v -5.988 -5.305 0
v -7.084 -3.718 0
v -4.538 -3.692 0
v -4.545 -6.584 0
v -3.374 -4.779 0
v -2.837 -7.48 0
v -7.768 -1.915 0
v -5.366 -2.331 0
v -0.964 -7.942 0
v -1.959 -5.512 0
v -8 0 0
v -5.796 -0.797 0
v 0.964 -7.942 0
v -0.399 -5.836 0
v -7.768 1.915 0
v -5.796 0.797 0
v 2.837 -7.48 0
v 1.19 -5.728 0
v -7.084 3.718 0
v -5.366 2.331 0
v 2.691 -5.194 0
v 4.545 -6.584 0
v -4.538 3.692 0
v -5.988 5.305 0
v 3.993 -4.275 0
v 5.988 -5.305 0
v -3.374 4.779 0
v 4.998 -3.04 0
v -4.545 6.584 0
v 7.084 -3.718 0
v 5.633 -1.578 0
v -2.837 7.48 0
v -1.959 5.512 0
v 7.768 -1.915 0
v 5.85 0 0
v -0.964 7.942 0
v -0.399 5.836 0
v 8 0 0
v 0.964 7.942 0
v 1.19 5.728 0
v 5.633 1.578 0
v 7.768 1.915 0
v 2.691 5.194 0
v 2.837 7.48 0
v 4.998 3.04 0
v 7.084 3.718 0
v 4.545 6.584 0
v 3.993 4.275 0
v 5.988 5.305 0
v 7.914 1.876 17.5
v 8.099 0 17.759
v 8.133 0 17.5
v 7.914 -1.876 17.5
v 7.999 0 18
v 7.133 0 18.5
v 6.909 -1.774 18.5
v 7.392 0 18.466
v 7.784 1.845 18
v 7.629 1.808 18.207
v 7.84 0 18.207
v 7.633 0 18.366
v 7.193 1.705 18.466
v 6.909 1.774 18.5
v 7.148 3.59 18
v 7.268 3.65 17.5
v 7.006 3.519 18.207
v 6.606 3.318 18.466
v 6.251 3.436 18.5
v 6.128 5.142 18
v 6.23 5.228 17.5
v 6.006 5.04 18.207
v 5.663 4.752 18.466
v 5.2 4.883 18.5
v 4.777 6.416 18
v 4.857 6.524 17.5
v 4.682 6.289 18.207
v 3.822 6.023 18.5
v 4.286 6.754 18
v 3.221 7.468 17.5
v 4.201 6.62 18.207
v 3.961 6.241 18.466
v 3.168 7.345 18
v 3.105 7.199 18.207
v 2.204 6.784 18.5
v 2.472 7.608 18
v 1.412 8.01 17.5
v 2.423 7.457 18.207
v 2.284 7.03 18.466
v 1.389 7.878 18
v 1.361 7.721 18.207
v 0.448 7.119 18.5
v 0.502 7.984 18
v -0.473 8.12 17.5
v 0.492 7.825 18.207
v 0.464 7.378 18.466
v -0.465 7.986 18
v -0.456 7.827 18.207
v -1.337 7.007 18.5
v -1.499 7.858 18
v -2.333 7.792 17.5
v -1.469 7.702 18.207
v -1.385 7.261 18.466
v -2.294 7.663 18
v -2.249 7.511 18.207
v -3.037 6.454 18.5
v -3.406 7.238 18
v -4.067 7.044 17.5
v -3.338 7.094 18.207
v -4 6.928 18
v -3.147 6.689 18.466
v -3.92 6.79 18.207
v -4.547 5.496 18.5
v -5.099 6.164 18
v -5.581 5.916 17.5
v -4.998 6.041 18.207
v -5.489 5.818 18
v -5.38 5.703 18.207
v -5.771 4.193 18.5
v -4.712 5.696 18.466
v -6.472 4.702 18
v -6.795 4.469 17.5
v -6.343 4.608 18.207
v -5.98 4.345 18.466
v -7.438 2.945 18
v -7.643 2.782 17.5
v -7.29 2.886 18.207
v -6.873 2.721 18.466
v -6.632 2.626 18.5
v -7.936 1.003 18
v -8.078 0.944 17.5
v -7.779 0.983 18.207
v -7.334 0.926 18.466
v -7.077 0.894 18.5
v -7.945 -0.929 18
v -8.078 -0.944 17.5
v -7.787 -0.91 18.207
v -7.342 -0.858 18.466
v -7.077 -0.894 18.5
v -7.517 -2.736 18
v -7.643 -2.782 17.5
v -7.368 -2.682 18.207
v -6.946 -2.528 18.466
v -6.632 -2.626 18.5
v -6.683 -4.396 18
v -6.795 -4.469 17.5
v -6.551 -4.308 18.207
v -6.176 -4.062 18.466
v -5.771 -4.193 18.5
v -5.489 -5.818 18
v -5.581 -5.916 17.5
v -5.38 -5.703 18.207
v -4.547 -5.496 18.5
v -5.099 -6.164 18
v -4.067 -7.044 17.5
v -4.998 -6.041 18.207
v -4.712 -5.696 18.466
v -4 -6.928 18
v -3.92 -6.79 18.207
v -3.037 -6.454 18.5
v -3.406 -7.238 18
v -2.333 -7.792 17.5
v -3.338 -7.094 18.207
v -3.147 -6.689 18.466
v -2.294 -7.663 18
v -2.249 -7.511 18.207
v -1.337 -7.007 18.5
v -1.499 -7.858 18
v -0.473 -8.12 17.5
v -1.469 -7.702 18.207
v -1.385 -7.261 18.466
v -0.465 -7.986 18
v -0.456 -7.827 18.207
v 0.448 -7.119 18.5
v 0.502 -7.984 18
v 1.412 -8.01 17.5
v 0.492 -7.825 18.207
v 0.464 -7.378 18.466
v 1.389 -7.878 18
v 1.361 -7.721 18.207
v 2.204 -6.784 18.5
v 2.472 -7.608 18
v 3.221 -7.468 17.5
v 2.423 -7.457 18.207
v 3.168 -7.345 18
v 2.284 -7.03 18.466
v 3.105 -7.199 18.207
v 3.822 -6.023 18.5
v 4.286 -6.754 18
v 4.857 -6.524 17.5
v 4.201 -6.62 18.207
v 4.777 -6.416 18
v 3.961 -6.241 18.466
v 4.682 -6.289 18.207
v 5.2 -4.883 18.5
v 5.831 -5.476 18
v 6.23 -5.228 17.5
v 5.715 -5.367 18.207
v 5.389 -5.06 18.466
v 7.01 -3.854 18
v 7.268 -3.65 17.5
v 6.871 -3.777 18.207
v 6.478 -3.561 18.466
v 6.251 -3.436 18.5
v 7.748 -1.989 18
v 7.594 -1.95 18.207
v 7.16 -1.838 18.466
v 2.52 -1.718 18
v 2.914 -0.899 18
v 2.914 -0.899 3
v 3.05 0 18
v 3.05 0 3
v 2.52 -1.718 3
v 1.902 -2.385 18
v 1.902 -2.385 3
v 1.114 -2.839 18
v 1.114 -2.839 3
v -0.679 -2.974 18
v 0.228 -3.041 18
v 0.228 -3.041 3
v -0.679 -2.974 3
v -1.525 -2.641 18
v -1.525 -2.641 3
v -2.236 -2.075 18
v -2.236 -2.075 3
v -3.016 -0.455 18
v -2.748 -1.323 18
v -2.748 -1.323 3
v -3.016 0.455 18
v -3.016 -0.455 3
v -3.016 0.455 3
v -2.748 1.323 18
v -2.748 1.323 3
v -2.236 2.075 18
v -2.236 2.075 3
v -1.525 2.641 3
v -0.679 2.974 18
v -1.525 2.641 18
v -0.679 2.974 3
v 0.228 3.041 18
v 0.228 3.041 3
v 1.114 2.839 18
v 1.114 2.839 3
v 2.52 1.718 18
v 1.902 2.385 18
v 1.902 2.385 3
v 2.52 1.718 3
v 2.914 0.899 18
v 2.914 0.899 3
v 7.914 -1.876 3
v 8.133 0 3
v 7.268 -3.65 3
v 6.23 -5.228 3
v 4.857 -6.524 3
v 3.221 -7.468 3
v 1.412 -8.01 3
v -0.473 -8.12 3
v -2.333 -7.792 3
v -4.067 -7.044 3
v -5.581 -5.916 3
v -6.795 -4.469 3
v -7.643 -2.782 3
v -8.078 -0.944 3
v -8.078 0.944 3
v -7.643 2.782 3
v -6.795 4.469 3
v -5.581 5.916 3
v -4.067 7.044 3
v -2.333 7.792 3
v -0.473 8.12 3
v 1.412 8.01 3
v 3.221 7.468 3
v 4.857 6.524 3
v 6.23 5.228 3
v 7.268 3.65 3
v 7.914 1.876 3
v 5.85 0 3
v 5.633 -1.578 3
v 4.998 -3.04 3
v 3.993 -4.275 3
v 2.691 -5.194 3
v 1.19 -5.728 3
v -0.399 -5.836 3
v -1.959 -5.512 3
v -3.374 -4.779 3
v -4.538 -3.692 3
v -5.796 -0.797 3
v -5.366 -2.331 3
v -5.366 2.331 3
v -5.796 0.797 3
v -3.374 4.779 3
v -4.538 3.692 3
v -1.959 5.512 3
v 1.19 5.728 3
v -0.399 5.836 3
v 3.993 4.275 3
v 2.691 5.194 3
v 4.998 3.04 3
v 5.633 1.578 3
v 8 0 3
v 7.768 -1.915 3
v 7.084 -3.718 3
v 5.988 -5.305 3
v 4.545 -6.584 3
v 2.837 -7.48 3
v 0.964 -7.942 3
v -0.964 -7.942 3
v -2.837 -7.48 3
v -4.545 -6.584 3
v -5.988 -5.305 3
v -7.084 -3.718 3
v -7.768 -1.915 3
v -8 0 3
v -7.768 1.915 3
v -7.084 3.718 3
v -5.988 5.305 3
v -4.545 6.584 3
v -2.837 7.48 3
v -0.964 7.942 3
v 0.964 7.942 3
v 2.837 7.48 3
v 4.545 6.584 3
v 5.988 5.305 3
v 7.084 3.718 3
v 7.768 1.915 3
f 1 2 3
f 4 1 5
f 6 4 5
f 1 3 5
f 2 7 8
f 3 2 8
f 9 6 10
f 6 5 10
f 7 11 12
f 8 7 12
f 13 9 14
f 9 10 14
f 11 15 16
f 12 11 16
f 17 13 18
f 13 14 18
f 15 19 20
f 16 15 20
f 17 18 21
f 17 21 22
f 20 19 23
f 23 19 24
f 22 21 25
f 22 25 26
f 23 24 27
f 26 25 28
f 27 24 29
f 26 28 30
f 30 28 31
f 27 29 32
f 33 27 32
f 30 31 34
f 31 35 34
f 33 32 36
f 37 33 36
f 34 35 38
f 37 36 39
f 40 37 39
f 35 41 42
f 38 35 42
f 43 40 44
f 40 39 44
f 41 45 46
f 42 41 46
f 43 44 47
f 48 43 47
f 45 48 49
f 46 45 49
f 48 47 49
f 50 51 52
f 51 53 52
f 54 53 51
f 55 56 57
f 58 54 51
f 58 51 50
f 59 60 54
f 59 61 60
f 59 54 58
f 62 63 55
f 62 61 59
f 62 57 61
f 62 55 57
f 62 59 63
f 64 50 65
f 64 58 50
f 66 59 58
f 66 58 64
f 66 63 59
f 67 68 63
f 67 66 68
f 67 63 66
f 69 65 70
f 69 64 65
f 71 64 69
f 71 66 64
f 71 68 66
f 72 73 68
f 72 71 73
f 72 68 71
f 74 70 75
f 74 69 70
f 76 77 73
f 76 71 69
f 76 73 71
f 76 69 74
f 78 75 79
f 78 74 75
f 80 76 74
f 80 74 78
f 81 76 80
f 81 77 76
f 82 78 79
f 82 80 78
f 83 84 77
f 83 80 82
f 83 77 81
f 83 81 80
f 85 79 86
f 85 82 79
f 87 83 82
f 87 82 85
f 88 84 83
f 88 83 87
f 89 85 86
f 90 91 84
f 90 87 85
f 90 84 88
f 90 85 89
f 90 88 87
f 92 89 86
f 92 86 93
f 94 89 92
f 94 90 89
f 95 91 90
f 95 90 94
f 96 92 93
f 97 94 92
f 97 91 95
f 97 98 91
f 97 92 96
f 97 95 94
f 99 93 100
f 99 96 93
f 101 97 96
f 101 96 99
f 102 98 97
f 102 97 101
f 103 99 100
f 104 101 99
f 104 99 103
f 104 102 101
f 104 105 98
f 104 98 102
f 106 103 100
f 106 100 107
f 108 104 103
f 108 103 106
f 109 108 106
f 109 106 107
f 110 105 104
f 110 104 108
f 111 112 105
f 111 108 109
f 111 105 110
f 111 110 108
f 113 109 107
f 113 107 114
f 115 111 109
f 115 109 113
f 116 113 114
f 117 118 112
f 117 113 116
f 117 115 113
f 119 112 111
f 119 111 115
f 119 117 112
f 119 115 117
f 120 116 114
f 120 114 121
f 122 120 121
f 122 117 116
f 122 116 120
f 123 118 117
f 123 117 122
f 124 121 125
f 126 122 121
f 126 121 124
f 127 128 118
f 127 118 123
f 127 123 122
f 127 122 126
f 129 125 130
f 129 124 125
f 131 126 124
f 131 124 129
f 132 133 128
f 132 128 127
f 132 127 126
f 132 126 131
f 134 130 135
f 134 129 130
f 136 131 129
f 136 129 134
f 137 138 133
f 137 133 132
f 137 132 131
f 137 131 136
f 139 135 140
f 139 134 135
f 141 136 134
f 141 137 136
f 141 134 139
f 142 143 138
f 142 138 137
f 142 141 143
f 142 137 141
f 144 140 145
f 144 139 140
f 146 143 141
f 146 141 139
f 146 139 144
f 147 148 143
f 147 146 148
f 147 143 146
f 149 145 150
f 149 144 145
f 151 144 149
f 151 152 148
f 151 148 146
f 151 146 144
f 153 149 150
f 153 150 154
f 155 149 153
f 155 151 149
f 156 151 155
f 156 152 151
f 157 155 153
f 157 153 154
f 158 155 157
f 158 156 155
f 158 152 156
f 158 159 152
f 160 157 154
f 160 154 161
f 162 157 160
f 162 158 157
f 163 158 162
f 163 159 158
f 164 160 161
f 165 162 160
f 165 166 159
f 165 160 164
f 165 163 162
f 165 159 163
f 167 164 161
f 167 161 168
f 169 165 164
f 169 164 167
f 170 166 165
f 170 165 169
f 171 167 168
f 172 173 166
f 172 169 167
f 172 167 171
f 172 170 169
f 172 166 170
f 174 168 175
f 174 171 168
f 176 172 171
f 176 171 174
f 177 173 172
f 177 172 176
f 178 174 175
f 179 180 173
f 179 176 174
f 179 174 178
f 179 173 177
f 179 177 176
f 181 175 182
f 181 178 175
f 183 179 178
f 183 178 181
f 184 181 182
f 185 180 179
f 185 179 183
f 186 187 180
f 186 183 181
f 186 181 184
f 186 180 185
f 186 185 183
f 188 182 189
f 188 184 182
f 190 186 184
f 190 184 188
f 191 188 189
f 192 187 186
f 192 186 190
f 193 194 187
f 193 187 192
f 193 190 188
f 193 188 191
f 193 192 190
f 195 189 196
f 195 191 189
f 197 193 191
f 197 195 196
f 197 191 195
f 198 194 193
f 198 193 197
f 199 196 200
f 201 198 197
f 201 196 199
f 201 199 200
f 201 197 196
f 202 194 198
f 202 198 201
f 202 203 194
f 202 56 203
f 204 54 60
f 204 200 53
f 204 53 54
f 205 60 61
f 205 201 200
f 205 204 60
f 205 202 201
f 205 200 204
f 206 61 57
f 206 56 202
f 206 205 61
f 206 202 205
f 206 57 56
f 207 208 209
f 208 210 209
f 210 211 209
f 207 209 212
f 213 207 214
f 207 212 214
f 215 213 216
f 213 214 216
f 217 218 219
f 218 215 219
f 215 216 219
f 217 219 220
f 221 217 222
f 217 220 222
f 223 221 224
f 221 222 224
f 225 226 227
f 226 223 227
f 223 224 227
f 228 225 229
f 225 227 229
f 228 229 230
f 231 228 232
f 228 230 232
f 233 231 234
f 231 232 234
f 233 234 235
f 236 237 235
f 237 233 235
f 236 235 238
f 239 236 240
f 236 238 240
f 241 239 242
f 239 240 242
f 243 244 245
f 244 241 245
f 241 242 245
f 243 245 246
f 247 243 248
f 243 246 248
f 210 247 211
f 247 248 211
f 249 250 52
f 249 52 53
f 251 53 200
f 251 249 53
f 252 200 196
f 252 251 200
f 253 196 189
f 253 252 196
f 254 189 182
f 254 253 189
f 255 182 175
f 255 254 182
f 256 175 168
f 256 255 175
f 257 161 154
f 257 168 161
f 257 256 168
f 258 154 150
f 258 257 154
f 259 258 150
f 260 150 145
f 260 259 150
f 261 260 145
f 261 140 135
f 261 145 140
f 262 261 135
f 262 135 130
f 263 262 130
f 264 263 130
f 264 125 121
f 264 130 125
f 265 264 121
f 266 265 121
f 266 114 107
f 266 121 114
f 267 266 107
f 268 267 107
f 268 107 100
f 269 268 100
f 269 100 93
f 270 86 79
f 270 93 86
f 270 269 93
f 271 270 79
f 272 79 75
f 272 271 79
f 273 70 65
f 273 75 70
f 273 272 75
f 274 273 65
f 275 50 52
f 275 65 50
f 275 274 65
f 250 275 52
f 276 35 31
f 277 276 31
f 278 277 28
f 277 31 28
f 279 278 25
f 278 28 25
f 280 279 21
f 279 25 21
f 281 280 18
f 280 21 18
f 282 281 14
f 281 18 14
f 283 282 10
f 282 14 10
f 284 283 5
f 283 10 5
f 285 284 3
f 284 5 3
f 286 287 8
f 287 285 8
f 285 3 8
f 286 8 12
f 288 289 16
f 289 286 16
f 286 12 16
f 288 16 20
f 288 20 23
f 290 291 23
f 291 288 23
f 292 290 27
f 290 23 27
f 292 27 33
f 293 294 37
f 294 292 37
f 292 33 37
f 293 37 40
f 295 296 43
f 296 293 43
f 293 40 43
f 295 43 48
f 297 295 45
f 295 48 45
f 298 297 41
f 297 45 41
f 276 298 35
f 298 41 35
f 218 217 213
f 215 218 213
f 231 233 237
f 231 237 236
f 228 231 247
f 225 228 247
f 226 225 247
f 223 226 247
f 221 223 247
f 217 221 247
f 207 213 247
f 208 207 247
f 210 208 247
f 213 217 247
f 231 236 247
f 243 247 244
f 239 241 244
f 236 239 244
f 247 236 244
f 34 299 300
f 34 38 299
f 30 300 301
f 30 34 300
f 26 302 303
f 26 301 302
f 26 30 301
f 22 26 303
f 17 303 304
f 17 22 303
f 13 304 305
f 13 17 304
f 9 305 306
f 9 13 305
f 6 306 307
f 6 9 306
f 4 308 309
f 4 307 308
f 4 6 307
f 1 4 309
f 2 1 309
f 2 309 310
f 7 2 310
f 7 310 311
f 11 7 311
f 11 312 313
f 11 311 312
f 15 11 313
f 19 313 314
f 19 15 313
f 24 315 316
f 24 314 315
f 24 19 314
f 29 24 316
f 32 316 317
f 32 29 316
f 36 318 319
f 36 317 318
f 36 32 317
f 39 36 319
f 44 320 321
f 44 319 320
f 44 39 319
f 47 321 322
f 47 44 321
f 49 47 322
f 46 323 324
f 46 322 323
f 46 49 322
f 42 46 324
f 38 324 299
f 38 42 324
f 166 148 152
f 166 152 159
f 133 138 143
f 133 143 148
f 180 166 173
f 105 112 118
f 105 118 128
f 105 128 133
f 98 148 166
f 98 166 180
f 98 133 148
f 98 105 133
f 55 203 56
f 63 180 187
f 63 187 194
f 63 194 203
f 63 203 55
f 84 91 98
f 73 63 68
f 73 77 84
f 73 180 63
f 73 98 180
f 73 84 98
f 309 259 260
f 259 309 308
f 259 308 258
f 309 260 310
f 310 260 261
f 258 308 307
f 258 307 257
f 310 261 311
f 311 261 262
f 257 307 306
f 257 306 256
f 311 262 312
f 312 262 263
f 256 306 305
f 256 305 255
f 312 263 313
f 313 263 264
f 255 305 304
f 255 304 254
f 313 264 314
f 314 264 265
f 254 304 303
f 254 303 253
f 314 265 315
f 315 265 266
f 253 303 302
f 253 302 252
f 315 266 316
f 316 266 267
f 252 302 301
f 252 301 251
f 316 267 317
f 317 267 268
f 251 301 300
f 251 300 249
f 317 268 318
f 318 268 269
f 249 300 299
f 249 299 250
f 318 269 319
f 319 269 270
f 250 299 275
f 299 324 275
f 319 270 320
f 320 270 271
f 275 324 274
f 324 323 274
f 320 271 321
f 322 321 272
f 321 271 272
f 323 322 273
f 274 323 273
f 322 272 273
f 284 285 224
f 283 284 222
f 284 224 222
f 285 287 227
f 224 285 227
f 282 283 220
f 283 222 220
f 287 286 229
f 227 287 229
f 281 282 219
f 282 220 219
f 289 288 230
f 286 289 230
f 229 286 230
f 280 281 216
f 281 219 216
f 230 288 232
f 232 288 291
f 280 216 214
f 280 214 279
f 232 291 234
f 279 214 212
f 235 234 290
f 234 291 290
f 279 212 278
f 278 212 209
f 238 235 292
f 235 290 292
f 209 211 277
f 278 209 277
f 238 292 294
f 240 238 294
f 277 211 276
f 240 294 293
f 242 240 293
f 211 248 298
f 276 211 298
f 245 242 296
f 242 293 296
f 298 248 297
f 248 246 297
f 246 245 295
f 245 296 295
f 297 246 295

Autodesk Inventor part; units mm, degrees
ref_plane "YZ Plane" through (0, 0, 0) normal (1, 0, 0) x (0, 1, 0)
ref_plane "XZ Plane" through (0, 0, 0) normal (0, 1, 0) x (-1, 0, 0)
ref_plane "XY Plane" through (0, 0, 0) normal (0, 0, 1) x (1, 0, 0)
sketch "Skizze1" plane through (0, 0, 0) normal (0, 0, 1) x (1, 0, 0)
  circle A0 centre (0, 0) radius 8.5 projected
  circle A1 centre (0, 0) radius 3.7 projected
  circle A2 centre (0, 0) radius 8
  circle A3 centre (0, 0) radius 5.85
  point P0 (0, 0)
  dimension "d0" = 16
  dimension "d1" = 11.7
extrude "Extrusion1" add sketch "Skizze1" along normal blind 3 contours A2
sketch "Skizze2" plane through (0, 0, 3) normal (0, 0, 1) x (1, 0, 0)
  circle A0 centre (0, 0) radius 3.05
  circle A1 centre (0, 0) radius 8.1333
  dimension "d4" = 6.1
extrude "Extrusion2" add sketch "Skizze2" along normal blind 15
sketch "Skizze3" plane through (0, 0, 18) normal (0, 0, 1) x (1, 0, 0)
  circle A0 centre (0, 0) radius 8.1333 projected
extrude "Extrusion3" add sketch "Skizze3" along normal blind 0.5
fillet "Rundung1" radius 1 1 edges at (-8.1333, 0, 18.5)
properties part number "Knopp"
